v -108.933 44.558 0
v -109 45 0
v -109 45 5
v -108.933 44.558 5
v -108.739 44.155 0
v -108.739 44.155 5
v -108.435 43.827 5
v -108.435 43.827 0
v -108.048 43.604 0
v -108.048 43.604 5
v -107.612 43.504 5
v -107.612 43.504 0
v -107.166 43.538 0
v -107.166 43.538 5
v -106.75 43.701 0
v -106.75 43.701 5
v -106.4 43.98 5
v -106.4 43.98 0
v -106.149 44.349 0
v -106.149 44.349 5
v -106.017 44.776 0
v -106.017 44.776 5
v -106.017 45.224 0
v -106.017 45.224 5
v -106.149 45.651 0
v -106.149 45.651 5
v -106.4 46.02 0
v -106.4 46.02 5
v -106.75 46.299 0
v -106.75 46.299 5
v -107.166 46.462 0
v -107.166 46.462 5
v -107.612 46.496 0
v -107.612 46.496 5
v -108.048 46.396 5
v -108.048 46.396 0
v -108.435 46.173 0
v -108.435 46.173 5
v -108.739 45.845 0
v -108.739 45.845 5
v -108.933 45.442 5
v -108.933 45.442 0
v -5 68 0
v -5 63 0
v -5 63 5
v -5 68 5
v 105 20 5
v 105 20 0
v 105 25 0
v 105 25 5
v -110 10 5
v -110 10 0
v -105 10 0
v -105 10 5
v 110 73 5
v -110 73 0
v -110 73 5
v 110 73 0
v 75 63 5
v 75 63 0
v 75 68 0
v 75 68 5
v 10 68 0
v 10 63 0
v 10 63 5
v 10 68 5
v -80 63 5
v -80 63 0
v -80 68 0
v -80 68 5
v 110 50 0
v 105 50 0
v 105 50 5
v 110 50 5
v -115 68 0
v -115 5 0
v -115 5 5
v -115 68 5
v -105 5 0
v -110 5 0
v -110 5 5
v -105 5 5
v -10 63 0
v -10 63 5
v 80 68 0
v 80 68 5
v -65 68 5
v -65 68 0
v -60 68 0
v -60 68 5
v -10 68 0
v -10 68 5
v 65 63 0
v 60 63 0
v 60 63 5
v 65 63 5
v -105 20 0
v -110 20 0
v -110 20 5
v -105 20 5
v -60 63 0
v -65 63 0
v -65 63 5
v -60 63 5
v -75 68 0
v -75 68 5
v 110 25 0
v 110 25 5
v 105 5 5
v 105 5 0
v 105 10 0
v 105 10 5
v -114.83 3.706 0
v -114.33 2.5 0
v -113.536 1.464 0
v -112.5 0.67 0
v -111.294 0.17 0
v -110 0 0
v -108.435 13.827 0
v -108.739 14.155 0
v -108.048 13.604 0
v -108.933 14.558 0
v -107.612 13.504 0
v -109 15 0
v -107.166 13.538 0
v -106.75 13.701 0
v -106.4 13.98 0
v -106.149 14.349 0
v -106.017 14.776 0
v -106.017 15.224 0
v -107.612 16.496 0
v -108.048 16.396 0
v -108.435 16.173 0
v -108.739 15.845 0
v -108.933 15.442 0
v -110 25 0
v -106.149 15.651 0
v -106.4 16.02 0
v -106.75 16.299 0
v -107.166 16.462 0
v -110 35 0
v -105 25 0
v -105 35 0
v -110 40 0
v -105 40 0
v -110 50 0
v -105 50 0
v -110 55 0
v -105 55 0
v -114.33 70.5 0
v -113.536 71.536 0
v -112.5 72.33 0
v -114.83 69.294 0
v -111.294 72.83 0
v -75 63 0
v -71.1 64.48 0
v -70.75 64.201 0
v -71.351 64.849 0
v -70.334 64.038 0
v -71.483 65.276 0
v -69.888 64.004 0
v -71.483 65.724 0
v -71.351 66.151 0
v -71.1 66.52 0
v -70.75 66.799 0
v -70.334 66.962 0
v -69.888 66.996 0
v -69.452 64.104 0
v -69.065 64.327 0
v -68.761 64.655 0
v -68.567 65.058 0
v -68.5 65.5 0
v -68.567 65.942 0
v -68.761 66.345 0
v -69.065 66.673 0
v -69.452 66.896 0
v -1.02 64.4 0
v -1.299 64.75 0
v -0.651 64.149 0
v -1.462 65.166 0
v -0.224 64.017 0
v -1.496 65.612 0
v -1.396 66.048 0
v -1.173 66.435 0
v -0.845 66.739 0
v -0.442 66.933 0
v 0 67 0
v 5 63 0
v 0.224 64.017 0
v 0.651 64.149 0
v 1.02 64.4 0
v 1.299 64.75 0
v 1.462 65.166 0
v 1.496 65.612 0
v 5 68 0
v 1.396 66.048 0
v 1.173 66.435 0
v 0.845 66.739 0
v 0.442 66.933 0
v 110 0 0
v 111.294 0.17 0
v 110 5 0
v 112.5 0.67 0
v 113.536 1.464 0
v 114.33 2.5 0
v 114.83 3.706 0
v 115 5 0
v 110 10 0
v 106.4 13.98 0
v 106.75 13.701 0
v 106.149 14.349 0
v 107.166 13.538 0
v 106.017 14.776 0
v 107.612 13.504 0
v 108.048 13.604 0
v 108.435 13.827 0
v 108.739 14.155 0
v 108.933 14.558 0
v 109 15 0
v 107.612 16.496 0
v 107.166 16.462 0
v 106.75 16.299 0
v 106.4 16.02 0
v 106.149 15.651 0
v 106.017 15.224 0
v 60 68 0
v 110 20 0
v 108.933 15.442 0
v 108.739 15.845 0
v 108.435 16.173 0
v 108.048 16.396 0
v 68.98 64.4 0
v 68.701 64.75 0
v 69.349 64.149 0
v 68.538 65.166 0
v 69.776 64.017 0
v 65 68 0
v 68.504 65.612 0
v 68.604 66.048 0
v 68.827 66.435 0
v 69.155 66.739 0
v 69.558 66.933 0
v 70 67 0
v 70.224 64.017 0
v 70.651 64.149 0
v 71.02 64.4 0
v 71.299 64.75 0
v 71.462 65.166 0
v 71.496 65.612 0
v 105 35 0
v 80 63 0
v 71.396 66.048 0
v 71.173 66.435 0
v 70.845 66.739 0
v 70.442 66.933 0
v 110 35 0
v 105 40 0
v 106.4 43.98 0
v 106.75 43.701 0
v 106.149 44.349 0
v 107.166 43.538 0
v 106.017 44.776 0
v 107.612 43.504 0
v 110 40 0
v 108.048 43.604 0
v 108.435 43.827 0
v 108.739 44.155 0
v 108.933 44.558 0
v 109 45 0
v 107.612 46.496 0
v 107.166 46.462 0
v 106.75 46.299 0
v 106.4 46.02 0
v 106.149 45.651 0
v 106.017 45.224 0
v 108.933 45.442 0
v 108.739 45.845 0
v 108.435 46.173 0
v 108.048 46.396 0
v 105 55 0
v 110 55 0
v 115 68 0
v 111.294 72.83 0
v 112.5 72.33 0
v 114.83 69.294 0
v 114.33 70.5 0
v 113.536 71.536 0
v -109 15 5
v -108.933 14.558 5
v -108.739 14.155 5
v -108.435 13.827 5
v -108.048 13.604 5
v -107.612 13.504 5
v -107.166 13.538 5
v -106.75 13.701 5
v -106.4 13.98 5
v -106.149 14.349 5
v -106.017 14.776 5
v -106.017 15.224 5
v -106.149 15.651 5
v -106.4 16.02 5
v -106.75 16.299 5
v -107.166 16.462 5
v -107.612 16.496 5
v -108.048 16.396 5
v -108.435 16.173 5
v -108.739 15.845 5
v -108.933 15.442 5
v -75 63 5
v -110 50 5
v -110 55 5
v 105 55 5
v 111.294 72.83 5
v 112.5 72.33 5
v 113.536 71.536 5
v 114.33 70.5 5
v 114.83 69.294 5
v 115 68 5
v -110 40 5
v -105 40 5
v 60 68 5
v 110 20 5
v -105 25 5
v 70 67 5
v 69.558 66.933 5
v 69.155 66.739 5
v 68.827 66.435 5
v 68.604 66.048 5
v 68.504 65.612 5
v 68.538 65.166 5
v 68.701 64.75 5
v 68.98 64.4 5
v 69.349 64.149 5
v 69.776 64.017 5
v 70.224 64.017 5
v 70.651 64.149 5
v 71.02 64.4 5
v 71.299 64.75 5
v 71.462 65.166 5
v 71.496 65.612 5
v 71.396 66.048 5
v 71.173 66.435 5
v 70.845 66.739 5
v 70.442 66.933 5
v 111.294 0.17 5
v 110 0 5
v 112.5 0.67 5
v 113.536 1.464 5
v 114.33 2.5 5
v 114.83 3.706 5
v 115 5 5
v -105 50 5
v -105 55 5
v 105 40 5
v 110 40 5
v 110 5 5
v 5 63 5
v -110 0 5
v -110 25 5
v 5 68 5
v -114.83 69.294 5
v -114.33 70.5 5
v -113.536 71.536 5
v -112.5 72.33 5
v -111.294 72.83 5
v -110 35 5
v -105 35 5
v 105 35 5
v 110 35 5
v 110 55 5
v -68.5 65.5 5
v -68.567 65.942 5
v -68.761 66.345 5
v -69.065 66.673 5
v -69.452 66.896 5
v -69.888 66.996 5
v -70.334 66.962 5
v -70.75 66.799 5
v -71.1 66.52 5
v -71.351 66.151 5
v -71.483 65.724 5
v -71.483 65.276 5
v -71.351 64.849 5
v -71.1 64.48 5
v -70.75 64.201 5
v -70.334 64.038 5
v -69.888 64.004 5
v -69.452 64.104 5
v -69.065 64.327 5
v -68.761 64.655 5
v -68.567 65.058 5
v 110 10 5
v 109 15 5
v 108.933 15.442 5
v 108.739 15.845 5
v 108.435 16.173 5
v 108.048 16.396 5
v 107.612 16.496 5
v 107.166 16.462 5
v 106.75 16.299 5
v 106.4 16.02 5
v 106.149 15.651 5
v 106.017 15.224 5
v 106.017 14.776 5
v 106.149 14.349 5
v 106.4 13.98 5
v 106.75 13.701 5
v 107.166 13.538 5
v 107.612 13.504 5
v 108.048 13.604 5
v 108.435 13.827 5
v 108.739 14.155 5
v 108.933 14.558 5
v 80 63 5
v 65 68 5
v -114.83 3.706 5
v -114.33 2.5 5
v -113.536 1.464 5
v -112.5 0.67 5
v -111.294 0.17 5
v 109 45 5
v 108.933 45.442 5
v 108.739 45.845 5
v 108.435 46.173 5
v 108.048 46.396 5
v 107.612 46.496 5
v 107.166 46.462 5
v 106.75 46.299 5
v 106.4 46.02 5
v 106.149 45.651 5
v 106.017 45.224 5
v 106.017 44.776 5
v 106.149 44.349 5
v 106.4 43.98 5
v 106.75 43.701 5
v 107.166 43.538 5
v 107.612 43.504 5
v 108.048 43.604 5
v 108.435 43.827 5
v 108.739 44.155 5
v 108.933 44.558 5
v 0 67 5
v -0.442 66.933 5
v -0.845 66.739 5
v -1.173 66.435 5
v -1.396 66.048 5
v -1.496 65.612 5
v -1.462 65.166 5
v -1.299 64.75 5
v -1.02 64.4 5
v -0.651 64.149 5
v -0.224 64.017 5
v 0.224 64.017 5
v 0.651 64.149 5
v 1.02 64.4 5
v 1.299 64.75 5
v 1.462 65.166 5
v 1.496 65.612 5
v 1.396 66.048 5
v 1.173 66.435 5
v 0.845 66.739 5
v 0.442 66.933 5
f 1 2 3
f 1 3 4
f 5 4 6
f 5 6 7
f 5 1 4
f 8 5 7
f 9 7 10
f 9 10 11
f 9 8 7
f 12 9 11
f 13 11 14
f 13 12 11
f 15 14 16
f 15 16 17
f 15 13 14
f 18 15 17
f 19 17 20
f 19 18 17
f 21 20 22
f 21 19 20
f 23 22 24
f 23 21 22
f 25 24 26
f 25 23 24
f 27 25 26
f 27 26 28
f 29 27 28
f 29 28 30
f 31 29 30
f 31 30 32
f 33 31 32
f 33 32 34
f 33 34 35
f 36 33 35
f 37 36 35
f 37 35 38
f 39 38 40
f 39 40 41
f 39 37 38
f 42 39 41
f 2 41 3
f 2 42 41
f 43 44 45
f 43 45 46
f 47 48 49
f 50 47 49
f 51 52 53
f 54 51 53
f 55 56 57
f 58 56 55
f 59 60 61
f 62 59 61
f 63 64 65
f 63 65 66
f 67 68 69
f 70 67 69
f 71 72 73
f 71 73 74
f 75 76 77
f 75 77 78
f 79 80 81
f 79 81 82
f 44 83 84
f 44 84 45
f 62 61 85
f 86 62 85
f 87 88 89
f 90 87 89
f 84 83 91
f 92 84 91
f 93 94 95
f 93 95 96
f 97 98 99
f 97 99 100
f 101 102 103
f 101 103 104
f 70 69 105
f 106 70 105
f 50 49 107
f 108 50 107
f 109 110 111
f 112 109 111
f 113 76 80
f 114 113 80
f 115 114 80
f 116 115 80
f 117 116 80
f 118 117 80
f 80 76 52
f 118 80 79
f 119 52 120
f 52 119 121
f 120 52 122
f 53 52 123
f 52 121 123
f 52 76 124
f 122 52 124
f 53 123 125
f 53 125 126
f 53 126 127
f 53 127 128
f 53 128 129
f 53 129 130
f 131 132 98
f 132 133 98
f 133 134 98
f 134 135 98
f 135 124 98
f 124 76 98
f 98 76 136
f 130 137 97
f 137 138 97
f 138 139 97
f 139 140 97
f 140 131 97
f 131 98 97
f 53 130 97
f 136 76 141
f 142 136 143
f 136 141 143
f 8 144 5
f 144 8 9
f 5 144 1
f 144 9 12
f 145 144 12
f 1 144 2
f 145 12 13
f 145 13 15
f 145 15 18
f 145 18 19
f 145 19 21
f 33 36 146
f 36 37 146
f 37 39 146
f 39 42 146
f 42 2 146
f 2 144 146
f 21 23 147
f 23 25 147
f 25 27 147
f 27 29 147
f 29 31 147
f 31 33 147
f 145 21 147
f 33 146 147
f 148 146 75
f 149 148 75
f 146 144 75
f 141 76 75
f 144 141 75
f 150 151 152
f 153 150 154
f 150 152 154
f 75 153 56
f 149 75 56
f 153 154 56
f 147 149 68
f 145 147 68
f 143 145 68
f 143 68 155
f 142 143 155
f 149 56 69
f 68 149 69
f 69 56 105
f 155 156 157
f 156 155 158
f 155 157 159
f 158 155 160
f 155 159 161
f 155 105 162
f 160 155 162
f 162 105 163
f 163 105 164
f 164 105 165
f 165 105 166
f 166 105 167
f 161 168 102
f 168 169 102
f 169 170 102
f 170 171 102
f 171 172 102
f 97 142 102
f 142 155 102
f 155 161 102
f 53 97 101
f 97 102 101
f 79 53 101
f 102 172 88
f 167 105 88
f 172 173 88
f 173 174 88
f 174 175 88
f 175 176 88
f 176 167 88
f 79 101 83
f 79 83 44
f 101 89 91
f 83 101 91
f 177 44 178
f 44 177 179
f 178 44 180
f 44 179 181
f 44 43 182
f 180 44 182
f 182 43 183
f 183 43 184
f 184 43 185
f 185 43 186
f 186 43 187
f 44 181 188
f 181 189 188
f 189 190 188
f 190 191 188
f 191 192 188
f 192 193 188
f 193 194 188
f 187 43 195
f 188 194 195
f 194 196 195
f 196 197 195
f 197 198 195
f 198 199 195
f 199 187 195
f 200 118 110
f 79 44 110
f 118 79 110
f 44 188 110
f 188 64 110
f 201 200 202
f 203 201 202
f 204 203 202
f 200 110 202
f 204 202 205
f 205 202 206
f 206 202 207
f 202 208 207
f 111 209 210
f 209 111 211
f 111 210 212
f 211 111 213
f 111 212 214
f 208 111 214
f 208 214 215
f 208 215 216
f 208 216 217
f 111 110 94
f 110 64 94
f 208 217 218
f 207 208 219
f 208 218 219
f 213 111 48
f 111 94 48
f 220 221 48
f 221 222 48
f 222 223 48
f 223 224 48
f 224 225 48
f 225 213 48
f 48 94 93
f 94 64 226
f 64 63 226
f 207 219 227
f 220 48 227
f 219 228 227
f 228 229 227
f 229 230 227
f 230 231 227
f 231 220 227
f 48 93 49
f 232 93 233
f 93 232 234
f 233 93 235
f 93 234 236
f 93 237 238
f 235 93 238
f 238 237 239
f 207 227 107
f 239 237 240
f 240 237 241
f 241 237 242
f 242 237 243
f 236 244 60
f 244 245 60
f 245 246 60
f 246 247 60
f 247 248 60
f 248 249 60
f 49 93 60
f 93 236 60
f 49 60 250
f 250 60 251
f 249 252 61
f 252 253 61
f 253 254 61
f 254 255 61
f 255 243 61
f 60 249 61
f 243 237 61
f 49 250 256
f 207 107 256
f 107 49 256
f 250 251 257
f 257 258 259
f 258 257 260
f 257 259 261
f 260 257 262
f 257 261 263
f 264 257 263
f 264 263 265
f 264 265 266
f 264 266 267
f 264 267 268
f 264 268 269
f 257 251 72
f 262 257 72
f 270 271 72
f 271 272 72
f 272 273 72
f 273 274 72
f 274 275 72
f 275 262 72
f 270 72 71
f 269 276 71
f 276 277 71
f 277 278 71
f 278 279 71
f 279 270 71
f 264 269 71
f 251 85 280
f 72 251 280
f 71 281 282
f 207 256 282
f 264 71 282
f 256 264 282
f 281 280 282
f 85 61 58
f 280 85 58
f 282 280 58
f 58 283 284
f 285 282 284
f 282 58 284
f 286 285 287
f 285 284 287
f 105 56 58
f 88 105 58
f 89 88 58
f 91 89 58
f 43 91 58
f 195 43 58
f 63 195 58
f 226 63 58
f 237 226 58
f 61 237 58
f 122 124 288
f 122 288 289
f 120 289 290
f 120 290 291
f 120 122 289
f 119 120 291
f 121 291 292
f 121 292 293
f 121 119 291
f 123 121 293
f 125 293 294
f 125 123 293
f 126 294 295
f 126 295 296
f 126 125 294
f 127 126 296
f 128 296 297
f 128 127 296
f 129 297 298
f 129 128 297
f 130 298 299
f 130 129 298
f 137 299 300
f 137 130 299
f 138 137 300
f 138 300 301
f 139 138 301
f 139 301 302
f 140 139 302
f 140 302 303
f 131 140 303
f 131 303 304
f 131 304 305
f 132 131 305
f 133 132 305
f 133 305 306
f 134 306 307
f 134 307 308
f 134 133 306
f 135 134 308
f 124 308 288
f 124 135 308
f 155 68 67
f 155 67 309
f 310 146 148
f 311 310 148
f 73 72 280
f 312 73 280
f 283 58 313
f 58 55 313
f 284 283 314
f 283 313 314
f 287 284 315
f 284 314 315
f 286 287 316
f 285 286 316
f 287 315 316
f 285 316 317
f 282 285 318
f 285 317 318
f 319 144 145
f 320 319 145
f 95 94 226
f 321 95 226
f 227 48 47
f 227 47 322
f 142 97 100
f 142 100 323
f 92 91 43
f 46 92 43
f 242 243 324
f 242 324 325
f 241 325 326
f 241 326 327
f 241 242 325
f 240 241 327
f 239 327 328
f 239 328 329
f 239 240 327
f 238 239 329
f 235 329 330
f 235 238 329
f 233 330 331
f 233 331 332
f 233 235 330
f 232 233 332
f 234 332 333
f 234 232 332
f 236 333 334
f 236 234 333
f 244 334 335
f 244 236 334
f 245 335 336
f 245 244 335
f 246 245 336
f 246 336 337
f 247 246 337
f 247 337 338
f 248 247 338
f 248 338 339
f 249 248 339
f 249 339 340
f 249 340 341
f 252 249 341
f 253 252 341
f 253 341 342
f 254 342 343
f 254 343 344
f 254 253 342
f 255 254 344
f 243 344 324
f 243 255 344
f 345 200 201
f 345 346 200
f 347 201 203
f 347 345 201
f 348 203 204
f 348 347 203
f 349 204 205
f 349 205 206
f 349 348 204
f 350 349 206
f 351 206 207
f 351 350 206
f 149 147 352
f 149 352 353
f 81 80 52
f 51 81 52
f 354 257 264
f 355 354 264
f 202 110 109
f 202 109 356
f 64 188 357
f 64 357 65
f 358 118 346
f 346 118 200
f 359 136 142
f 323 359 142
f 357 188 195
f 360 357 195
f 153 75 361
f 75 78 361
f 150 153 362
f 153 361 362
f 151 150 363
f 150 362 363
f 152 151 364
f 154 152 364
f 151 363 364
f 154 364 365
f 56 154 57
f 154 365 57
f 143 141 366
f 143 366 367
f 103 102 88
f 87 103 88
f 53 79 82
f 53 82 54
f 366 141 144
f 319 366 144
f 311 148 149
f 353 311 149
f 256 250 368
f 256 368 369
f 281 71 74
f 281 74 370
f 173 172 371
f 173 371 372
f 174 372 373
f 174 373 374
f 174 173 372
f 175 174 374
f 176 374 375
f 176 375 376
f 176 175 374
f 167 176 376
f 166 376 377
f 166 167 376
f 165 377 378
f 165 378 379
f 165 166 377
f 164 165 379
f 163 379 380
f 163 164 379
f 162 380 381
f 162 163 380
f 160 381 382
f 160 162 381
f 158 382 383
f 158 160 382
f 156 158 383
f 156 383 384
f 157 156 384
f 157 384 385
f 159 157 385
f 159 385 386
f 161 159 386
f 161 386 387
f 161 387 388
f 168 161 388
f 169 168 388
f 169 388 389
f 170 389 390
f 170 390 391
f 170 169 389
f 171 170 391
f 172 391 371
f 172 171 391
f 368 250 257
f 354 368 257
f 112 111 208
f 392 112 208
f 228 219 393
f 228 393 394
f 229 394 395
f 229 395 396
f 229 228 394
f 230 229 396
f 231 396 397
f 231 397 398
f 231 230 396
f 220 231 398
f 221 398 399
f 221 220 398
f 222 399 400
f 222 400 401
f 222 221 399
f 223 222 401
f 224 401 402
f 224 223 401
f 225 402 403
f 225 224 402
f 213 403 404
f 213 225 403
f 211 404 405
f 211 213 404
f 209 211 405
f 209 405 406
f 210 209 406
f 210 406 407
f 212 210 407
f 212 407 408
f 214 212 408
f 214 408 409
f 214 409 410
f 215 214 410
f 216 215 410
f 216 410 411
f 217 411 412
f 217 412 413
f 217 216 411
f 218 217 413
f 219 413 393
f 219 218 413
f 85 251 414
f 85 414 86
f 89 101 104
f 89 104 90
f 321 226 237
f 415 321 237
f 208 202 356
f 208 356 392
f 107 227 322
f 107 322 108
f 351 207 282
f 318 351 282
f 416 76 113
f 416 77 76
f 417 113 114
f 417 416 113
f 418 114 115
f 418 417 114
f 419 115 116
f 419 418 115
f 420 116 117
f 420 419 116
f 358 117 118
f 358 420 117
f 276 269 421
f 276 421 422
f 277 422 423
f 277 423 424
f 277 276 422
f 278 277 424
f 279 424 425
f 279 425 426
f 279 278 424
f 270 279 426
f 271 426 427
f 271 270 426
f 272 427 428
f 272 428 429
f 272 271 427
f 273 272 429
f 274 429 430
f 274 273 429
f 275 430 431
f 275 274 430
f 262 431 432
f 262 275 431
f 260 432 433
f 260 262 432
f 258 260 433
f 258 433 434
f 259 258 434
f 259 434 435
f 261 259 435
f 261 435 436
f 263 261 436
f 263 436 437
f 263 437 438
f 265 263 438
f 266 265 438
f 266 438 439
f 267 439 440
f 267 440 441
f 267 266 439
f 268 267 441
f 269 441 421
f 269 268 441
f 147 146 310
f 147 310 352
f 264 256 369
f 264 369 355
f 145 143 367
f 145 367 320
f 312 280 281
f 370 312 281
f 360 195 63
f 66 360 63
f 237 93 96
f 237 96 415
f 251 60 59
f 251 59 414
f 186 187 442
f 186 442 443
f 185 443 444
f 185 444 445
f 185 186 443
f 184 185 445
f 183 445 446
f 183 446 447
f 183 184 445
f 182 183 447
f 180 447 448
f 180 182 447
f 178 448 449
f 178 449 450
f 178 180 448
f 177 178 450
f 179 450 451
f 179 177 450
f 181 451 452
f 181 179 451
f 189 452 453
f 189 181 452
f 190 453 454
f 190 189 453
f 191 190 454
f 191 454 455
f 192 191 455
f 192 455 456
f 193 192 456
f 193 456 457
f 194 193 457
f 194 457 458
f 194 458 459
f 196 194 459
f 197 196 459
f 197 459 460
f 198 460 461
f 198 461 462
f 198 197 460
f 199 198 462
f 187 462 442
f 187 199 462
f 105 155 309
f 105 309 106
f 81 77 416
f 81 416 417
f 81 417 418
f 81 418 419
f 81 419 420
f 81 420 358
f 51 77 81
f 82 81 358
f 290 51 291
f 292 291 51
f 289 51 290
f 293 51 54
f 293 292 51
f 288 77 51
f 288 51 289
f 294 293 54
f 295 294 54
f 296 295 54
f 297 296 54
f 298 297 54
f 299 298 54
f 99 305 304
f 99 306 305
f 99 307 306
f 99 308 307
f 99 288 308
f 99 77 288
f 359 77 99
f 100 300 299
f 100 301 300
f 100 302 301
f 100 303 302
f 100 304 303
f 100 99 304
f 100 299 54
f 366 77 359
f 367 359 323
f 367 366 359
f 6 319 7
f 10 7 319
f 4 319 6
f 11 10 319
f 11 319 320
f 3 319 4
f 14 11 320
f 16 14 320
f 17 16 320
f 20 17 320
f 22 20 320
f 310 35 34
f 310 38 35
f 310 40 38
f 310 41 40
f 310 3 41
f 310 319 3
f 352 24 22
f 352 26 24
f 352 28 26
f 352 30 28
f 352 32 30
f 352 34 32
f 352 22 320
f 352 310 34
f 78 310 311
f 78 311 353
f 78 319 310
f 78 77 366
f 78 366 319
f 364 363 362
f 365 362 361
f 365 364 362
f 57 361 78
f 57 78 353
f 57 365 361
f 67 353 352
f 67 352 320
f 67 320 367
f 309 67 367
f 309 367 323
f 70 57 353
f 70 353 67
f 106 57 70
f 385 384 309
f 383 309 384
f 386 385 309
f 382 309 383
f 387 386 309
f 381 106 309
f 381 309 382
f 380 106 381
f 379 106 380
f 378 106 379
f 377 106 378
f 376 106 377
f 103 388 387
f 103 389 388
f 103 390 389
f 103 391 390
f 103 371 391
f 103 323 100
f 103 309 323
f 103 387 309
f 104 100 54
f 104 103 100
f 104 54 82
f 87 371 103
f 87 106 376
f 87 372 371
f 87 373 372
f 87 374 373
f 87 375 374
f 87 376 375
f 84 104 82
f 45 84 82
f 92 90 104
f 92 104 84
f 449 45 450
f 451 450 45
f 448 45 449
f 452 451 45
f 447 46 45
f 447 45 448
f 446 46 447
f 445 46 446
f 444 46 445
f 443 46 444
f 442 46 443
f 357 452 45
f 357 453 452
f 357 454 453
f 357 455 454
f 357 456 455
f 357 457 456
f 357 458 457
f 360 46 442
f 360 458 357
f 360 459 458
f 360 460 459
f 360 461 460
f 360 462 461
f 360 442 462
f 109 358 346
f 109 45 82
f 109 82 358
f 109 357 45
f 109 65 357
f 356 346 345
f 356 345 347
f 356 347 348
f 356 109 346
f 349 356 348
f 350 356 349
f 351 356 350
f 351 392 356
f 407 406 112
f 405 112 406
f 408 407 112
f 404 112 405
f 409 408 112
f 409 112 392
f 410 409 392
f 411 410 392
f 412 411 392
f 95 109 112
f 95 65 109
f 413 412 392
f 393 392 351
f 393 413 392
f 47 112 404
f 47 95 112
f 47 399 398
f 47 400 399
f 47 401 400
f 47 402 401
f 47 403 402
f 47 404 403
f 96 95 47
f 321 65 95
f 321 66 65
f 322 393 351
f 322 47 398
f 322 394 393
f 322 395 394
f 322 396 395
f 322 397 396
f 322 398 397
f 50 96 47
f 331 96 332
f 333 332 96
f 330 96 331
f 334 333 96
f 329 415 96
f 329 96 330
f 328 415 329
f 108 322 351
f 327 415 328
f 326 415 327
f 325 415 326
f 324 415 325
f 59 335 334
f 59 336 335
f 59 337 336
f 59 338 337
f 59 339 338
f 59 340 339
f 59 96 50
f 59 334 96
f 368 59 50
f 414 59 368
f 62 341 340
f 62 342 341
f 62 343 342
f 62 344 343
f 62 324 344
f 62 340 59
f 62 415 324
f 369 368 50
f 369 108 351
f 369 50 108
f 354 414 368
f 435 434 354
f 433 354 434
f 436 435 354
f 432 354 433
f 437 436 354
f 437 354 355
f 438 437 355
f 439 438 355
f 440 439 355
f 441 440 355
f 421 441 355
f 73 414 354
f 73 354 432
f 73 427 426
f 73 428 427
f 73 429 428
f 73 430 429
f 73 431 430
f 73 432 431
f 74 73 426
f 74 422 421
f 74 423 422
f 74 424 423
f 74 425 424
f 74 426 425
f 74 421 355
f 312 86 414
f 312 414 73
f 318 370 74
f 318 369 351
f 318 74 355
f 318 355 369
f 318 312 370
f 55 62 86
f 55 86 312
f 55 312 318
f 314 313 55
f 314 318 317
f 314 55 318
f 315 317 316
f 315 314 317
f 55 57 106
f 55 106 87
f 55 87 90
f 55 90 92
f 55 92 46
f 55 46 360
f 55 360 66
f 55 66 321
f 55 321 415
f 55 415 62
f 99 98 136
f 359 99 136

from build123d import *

# Parameters (mm, degrees)
ESQUISSE1_W        = 230
ESQUISSE1_H        = 73
ESQUISSE1_R        = 1.5
ESQUISSE1_W_2      = 5
ESQUISSE1_H_2      = 5
BOSS_EXTRU_1_DEPTH = 5
CONG_1_R           = 5


with BuildPart() as part:
    # Esquisse1 → Boss.-Extru.1 (new body)
    with BuildSketch(Plane.XY):
        with Locations((0, 36.5)):
            Rectangle(ESQUISSE1_W, ESQUISSE1_H)
        with Locations((107.5, 45)):
            Circle(ESQUISSE1_R, mode=Mode.SUBTRACT)
        with Locations((107.5, 15)):
            Circle(ESQUISSE1_R, mode=Mode.SUBTRACT)
        with Locations(Location((-107.5, 15, 0), (0, 0, 180))):
            Circle(ESQUISSE1_R, mode=Mode.SUBTRACT)
        with Locations(Location((-107.5, 45, 0), (0, 0, 180))):
            Circle(ESQUISSE1_R, mode=Mode.SUBTRACT)
        with Locations(Location((0, 65.5, 0), (0, 0, 90))):
            Circle(ESQUISSE1_R, mode=Mode.SUBTRACT)
        with Locations(Location((70, 65.5, 0), (0, 0, 90))):
            Circle(ESQUISSE1_R, mode=Mode.SUBTRACT)
        with Locations((-70, 65.5)):
            Circle(ESQUISSE1_R, mode=Mode.SUBTRACT)
        with Locations((107.5, 37.5)):
            Rectangle(ESQUISSE1_W_2, ESQUISSE1_H_2, mode=Mode.SUBTRACT)
        with Locations((107.5, 52.5)):
            Rectangle(ESQUISSE1_W_2, ESQUISSE1_H_2, mode=Mode.SUBTRACT)
        with Locations((107.5, 7.5)):
            Rectangle(ESQUISSE1_W_2, ESQUISSE1_H_2, mode=Mode.SUBTRACT)
        with Locations((107.5, 22.5)):
            Rectangle(ESQUISSE1_W_2, ESQUISSE1_H_2, mode=Mode.SUBTRACT)
        with Locations((-107.5, 7.5)):
            Rectangle(ESQUISSE1_W_2, ESQUISSE1_H_2, mode=Mode.SUBTRACT)
        with Locations((-107.5, 22.5)):
            Rectangle(ESQUISSE1_W_2, ESQUISSE1_H_2, mode=Mode.SUBTRACT)
        with Locations((-107.5, 37.5)):
            Rectangle(ESQUISSE1_W_2, ESQUISSE1_H_2, mode=Mode.SUBTRACT)
        with Locations((-107.5, 52.5)):
            Rectangle(ESQUISSE1_W_2, ESQUISSE1_H_2, mode=Mode.SUBTRACT)
        with Locations((7.5, 65.5)):
            Rectangle(ESQUISSE1_W_2, ESQUISSE1_H_2, mode=Mode.SUBTRACT)
        with Locations((-7.5, 65.5)):
            Rectangle(ESQUISSE1_W_2, ESQUISSE1_H_2, mode=Mode.SUBTRACT)
        with Locations((77.5, 65.5)):
            Rectangle(ESQUISSE1_W_2, ESQUISSE1_H_2, mode=Mode.SUBTRACT)
        with Locations((62.5, 65.5)):
            Rectangle(ESQUISSE1_W_2, ESQUISSE1_H_2, mode=Mode.SUBTRACT)
        with Locations((-77.5, 65.5)):
            Rectangle(ESQUISSE1_W_2, ESQUISSE1_H_2, mode=Mode.SUBTRACT)
        with Locations((-62.5, 65.5)):
            Rectangle(ESQUISSE1_W_2, ESQUISSE1_H_2, mode=Mode.SUBTRACT)
    extrude(amount=BOSS_EXTRU_1_DEPTH)

    # Congé1
    cong_1_edges = [part.edges().sort_by_distance(p)[0] for p in [
        (-115, 73, 2.5),
        (115, 73, 2.5),
        (115, 0, 2.5),
        (-115, 0, 2.5),
    ]]
    fillet(cong_1_edges, radius=CONG_1_R)


solid = part.part
